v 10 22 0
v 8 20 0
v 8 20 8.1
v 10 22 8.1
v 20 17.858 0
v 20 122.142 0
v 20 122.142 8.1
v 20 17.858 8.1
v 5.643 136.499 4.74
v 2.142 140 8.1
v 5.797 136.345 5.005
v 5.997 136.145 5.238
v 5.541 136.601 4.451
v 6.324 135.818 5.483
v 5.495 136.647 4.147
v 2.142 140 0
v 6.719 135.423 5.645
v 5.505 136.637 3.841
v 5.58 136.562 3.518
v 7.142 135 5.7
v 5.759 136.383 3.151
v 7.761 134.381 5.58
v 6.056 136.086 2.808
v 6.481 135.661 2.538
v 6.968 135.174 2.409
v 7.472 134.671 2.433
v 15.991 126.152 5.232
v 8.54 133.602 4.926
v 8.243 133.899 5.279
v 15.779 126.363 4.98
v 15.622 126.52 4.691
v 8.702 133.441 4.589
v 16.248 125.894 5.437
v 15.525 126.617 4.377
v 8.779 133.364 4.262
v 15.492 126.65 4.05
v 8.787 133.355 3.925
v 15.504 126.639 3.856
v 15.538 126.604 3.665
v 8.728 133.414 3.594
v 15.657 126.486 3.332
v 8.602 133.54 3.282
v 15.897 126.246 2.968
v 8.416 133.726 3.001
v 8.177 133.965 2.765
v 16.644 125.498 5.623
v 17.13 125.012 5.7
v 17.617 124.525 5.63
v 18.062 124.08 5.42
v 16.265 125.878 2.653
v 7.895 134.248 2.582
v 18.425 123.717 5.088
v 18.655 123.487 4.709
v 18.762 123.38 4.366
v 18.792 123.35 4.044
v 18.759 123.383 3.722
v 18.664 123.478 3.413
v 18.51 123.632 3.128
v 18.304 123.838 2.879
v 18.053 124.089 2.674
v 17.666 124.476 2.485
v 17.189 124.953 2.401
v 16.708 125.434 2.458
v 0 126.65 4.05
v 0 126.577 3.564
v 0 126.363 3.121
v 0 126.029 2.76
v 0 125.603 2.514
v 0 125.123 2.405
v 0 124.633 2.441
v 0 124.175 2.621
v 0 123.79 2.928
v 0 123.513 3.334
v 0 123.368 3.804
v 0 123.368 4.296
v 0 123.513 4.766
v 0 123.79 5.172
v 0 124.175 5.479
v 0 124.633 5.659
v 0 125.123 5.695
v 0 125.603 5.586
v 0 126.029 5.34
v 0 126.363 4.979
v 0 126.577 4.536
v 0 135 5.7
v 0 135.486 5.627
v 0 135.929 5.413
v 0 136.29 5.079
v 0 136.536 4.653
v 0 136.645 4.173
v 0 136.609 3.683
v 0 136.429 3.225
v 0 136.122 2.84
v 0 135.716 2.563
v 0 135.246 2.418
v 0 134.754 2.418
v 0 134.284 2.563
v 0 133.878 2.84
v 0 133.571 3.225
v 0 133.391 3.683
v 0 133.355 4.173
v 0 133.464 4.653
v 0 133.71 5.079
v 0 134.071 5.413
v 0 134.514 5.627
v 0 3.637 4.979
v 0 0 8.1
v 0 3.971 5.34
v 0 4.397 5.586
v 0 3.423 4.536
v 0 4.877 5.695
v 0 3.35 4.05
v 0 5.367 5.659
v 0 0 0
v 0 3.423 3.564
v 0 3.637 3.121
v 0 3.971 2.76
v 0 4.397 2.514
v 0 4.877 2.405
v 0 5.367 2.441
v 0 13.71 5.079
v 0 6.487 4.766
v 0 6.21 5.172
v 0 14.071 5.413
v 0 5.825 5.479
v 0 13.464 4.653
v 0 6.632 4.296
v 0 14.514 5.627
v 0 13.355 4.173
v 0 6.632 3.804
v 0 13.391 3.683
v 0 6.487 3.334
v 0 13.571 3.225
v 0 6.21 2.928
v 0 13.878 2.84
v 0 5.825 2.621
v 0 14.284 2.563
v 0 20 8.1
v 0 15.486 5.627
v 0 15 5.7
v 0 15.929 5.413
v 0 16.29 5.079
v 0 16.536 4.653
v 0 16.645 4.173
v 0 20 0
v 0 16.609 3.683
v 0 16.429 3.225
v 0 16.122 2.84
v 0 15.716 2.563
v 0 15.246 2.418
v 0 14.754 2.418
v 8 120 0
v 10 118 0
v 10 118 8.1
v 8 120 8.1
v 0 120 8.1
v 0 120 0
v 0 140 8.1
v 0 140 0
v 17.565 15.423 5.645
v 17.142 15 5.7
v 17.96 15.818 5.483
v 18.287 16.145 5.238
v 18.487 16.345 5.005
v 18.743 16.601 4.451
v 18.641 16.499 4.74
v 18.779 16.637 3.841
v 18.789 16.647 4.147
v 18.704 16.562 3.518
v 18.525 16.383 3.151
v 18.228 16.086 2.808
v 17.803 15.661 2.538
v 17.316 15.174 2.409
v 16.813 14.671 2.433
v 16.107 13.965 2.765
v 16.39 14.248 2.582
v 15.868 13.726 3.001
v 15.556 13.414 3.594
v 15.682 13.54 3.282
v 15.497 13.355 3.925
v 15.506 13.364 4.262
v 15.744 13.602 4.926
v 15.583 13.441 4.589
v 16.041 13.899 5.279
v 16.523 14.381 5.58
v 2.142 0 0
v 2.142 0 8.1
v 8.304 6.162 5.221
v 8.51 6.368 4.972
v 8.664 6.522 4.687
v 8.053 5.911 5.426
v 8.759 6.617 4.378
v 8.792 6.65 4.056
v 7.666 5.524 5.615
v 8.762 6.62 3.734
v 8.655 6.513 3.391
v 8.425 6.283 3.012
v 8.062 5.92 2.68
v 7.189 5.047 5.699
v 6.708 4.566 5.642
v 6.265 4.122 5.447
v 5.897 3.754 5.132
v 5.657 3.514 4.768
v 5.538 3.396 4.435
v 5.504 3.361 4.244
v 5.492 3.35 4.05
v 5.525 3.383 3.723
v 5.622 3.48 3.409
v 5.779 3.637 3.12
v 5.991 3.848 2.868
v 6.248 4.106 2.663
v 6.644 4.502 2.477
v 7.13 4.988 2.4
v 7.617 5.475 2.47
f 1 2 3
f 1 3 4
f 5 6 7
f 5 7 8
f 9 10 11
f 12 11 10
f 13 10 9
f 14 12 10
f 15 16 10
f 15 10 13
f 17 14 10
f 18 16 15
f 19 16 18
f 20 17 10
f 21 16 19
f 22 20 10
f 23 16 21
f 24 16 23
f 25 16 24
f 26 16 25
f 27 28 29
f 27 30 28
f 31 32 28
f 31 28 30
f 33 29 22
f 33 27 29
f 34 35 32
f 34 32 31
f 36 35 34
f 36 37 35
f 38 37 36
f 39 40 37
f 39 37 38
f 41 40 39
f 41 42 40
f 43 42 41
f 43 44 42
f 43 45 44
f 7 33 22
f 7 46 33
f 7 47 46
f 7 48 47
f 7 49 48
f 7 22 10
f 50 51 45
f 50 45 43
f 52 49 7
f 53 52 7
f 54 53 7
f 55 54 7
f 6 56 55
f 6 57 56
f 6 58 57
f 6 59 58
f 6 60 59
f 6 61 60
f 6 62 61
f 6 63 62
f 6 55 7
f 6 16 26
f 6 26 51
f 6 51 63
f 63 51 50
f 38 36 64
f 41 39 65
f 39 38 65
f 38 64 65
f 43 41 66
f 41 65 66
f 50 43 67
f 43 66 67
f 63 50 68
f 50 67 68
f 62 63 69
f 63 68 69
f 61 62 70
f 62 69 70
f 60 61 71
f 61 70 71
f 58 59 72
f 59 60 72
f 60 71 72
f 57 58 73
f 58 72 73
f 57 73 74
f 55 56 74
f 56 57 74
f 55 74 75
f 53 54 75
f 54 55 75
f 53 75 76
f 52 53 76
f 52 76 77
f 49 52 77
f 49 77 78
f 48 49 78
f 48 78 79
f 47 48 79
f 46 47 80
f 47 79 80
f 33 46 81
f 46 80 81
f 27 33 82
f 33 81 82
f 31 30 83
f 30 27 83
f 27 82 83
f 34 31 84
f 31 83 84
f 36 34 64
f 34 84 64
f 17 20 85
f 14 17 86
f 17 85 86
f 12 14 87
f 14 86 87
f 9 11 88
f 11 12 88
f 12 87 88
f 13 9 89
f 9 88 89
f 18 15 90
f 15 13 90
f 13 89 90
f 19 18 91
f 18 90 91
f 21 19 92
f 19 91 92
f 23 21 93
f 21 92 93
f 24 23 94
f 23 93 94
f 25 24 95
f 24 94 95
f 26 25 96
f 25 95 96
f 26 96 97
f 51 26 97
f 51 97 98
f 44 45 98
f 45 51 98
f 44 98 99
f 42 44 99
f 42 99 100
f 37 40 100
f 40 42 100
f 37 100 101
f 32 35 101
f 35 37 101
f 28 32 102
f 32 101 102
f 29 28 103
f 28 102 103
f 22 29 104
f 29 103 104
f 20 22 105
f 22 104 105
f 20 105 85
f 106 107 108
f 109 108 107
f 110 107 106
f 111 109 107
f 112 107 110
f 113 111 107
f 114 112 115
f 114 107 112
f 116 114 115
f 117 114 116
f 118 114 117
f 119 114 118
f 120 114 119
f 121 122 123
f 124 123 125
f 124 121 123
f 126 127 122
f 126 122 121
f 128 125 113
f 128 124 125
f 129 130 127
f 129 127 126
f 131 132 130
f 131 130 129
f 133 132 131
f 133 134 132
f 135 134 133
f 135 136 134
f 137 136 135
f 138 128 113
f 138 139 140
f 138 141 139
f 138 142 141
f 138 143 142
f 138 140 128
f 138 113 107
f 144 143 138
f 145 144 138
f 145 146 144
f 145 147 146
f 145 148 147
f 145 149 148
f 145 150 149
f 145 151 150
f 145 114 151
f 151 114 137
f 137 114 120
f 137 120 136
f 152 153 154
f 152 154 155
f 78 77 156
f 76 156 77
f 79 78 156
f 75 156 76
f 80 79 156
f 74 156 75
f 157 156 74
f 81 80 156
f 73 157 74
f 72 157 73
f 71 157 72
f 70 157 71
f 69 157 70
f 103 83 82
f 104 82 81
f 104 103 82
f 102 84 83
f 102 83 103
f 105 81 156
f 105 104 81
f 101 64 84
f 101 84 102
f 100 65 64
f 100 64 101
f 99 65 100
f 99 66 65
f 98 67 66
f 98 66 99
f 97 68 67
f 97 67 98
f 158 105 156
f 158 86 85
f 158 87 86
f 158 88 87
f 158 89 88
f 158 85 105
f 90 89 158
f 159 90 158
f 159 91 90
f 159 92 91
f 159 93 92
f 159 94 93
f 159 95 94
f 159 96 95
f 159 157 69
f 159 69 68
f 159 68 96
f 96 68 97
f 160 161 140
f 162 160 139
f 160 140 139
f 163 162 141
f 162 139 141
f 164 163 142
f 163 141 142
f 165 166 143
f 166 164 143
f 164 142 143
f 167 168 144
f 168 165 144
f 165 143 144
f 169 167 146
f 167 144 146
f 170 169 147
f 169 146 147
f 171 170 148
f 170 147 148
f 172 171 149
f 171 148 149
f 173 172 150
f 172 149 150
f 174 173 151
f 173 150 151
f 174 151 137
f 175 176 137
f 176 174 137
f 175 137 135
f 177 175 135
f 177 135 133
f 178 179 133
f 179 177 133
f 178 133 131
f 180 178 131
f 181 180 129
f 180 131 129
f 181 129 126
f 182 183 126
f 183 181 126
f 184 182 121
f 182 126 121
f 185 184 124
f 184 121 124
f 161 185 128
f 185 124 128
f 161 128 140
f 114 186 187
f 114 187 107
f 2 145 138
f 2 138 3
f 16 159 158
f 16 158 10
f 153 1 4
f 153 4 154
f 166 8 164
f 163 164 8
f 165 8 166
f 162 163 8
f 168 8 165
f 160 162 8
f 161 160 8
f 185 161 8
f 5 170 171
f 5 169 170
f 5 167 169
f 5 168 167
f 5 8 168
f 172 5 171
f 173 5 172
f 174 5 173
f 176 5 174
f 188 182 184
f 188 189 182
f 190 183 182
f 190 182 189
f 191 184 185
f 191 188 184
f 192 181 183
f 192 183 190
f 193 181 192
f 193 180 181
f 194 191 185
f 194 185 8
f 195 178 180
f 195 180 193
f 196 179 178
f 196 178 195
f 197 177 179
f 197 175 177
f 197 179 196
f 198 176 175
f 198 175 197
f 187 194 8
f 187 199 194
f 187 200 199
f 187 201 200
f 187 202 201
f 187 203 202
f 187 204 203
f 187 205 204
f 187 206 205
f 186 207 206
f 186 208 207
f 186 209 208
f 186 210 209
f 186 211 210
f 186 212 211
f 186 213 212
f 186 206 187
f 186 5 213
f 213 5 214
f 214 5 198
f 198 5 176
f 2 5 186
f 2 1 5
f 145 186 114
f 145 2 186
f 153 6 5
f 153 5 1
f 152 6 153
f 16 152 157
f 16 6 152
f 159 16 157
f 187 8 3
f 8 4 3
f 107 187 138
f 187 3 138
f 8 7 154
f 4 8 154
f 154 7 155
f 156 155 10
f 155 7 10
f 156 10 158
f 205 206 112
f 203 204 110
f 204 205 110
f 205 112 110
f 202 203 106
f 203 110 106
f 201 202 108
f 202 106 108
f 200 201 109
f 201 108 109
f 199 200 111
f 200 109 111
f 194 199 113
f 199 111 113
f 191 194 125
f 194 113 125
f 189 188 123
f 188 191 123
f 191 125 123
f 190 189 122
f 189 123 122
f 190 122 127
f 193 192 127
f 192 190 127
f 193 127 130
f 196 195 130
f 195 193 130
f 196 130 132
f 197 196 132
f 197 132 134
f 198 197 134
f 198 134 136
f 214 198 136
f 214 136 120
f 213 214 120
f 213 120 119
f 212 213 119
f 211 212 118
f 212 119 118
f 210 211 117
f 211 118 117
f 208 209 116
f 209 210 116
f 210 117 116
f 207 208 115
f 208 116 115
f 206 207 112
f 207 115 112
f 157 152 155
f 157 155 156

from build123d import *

# Parameters (mm, degrees)
BOSS_EXTRU_1_DEPTH      = 8.1
ESQUISSE2_R             = 1.65
ENL_V_MAT_EXTRU_1_DEPTH = 142.653132687


with BuildPart() as part:
    # Esquisse1 → Boss.-Extru.1 (new body)
    with BuildSketch(Plane.XY):
        Polygon((0, 0), (0, 20), (8, 20), (10, 22), (10, 118), (8, 120), (0, 120), (0, 140), (2.142135624, 140), (20, 122.142135624), (20, 17.857864376), (2.142135624, 0), align=None)
    extrude(amount=BOSS_EXTRU_1_DEPTH)

    # Esquisse2 → Enlèv. mat.-Extru.1 (cut, through all)
    with BuildSketch(Plane.ZY):
        with Locations((4.05, 15)):
            Circle(ESQUISSE2_R)
        with Locations(Location((4.05, 5, 0), (0, 0, 270))):
            Circle(ESQUISSE2_R)
        with Locations((4.05, 135)):
            Circle(ESQUISSE2_R)
        with Locations(Location((4.05, 125, 0), (0, 0, 90))):
            Circle(ESQUISSE2_R)
    extrude(amount=-ENL_V_MAT_EXTRU_1_DEPTH, mode=Mode.SUBTRACT)


solid = part.part
